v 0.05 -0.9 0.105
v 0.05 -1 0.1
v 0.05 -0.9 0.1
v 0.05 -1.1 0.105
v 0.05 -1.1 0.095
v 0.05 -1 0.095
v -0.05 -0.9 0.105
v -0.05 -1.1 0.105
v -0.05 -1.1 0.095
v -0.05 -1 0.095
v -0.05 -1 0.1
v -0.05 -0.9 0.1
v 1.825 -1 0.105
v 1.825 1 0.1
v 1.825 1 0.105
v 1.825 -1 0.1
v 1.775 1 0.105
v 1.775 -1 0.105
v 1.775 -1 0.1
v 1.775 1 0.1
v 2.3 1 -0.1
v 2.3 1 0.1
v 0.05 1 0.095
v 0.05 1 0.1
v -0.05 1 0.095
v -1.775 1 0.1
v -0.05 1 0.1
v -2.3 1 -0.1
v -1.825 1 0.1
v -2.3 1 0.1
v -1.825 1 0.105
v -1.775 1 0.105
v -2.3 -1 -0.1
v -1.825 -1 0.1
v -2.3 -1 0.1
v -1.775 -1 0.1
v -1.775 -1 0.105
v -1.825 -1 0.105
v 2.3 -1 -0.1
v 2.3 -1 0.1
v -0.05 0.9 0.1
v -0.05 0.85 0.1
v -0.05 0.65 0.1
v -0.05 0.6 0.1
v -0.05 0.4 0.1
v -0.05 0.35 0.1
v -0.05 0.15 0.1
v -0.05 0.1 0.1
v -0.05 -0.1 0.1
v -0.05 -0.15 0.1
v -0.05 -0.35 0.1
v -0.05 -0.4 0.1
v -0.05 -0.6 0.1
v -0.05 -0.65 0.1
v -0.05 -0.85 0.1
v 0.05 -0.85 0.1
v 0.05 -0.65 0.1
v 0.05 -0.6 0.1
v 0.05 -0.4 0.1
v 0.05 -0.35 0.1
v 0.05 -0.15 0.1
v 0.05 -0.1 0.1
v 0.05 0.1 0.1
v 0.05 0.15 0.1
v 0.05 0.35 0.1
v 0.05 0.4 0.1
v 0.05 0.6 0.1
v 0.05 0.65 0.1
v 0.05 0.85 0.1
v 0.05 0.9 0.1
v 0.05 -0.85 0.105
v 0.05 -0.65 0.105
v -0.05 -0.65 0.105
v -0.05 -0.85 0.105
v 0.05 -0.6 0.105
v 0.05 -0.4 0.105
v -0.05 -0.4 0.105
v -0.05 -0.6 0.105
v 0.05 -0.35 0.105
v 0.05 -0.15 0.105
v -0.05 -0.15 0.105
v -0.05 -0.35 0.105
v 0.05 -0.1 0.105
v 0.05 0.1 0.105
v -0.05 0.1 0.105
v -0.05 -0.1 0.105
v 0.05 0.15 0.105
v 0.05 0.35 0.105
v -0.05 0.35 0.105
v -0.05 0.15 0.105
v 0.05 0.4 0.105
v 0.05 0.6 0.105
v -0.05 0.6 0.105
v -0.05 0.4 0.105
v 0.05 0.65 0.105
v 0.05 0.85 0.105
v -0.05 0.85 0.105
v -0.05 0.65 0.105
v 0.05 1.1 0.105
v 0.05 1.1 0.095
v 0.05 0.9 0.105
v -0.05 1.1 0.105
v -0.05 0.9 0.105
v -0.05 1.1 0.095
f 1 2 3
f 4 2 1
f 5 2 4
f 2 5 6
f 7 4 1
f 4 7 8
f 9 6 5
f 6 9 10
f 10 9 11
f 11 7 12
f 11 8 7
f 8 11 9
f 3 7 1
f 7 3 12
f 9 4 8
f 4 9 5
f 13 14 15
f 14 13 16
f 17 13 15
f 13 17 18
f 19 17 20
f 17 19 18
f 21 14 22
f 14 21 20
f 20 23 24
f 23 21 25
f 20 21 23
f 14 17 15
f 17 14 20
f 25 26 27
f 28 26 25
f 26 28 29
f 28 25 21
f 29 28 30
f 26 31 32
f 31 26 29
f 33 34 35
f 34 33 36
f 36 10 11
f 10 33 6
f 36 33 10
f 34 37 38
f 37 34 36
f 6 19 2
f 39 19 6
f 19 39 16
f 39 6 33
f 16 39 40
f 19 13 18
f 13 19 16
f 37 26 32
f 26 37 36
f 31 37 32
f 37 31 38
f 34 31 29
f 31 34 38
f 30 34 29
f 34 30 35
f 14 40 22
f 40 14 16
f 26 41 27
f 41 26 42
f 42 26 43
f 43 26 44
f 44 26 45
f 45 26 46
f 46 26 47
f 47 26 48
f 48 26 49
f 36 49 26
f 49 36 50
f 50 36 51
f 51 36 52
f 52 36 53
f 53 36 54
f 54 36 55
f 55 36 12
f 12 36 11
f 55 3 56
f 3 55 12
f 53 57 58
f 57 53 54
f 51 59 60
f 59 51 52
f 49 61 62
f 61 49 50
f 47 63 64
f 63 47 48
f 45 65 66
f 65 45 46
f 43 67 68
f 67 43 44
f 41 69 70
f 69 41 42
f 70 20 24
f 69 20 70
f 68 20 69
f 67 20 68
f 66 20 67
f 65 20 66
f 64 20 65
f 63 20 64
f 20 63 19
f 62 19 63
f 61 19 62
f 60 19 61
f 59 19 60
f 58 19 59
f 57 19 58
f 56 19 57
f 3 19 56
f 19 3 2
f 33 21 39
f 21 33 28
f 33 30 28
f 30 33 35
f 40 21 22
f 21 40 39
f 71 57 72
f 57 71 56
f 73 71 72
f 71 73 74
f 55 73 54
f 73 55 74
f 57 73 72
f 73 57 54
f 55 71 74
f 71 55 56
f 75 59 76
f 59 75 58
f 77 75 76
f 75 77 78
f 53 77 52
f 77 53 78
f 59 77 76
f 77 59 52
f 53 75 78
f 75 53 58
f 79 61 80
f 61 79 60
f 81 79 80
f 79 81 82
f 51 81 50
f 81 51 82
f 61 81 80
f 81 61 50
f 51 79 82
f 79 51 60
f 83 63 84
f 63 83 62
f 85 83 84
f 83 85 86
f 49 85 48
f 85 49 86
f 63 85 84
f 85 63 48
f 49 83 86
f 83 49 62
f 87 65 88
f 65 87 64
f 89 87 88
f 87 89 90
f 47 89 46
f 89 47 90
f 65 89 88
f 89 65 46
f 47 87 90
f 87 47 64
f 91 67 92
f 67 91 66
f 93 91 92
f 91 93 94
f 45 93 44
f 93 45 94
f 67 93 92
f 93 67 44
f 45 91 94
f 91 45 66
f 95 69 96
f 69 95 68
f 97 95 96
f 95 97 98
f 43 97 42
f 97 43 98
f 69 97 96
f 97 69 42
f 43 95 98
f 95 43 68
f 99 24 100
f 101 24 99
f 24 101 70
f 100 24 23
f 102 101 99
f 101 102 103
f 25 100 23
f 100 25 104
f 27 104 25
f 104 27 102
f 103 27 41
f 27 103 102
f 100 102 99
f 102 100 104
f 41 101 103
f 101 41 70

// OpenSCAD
module Street_04(col ="#3b4747"){  
    color(col)
    cube([4,2,0.2], center = true);

    for (i = [-1:0.25:1] ){
    
        translate([0,i,0.10])
        color("white")
        cube([0.1,0.2,0.01], center = true);

        translate([1.8,0,0.10])
        color("white")
        cube([0.05,2,0.01], center = true);

        translate([-1.8,0,0.10])
        color("white")
        cube([0.05,2,0.01], center = true);
        
        translate([-2.15,0,0.0])
        color("GRAY")
        cube([0.3,2,0.2], center = true);

        translate([2.15,0,0.0])
        color("GRAY")
        cube([0.3,2,0.2], center = true);

    }
}

Street_04();

// Written by Nicolì Angelo (Gengio) 2024: 
// MIT License

//Permission is hereby granted, free of charge, to any person obtaining a copy of this software and associated documentation files (the "Software"), to deal in the Software without restriction, including without limitation the rights to use, copy, modify, merge, publish, distribute, sublicense, and/or sell copies of the Software, and to permit persons to whom the Software is furnished to do so, subject to the following conditions:

//The above copyright notice and this permission notice shall be included in all copies or substantial portions of the Software.

//THE SOFTWARE IS PROVIDED "AS IS", WITHOUT WARRANTY OF ANY KIND, EXPRESS OR IMPLIED, INCLUDING BUT NOT LIMITED TO THE WARRANTIES OF MERCHANTABILITY, FITNESS FOR A PARTICULAR PURPOSE AND NONINFRINGEMENT. IN NO EVENT SHALL THE AUTHORS OR COPYRIGHT HOLDERS BE LIABLE FOR ANY CLAIM, DAMAGES OR OTHER LIABILITY, WHETHER IN AN ACTION OF CONTRACT, TORT OR OTHERWISE, ARISING FROM, OUT OF OR IN CONNECTION WITH THE SOFTWARE OR THE USE OR OTHER DEALINGS IN THE SOFTWARE.
